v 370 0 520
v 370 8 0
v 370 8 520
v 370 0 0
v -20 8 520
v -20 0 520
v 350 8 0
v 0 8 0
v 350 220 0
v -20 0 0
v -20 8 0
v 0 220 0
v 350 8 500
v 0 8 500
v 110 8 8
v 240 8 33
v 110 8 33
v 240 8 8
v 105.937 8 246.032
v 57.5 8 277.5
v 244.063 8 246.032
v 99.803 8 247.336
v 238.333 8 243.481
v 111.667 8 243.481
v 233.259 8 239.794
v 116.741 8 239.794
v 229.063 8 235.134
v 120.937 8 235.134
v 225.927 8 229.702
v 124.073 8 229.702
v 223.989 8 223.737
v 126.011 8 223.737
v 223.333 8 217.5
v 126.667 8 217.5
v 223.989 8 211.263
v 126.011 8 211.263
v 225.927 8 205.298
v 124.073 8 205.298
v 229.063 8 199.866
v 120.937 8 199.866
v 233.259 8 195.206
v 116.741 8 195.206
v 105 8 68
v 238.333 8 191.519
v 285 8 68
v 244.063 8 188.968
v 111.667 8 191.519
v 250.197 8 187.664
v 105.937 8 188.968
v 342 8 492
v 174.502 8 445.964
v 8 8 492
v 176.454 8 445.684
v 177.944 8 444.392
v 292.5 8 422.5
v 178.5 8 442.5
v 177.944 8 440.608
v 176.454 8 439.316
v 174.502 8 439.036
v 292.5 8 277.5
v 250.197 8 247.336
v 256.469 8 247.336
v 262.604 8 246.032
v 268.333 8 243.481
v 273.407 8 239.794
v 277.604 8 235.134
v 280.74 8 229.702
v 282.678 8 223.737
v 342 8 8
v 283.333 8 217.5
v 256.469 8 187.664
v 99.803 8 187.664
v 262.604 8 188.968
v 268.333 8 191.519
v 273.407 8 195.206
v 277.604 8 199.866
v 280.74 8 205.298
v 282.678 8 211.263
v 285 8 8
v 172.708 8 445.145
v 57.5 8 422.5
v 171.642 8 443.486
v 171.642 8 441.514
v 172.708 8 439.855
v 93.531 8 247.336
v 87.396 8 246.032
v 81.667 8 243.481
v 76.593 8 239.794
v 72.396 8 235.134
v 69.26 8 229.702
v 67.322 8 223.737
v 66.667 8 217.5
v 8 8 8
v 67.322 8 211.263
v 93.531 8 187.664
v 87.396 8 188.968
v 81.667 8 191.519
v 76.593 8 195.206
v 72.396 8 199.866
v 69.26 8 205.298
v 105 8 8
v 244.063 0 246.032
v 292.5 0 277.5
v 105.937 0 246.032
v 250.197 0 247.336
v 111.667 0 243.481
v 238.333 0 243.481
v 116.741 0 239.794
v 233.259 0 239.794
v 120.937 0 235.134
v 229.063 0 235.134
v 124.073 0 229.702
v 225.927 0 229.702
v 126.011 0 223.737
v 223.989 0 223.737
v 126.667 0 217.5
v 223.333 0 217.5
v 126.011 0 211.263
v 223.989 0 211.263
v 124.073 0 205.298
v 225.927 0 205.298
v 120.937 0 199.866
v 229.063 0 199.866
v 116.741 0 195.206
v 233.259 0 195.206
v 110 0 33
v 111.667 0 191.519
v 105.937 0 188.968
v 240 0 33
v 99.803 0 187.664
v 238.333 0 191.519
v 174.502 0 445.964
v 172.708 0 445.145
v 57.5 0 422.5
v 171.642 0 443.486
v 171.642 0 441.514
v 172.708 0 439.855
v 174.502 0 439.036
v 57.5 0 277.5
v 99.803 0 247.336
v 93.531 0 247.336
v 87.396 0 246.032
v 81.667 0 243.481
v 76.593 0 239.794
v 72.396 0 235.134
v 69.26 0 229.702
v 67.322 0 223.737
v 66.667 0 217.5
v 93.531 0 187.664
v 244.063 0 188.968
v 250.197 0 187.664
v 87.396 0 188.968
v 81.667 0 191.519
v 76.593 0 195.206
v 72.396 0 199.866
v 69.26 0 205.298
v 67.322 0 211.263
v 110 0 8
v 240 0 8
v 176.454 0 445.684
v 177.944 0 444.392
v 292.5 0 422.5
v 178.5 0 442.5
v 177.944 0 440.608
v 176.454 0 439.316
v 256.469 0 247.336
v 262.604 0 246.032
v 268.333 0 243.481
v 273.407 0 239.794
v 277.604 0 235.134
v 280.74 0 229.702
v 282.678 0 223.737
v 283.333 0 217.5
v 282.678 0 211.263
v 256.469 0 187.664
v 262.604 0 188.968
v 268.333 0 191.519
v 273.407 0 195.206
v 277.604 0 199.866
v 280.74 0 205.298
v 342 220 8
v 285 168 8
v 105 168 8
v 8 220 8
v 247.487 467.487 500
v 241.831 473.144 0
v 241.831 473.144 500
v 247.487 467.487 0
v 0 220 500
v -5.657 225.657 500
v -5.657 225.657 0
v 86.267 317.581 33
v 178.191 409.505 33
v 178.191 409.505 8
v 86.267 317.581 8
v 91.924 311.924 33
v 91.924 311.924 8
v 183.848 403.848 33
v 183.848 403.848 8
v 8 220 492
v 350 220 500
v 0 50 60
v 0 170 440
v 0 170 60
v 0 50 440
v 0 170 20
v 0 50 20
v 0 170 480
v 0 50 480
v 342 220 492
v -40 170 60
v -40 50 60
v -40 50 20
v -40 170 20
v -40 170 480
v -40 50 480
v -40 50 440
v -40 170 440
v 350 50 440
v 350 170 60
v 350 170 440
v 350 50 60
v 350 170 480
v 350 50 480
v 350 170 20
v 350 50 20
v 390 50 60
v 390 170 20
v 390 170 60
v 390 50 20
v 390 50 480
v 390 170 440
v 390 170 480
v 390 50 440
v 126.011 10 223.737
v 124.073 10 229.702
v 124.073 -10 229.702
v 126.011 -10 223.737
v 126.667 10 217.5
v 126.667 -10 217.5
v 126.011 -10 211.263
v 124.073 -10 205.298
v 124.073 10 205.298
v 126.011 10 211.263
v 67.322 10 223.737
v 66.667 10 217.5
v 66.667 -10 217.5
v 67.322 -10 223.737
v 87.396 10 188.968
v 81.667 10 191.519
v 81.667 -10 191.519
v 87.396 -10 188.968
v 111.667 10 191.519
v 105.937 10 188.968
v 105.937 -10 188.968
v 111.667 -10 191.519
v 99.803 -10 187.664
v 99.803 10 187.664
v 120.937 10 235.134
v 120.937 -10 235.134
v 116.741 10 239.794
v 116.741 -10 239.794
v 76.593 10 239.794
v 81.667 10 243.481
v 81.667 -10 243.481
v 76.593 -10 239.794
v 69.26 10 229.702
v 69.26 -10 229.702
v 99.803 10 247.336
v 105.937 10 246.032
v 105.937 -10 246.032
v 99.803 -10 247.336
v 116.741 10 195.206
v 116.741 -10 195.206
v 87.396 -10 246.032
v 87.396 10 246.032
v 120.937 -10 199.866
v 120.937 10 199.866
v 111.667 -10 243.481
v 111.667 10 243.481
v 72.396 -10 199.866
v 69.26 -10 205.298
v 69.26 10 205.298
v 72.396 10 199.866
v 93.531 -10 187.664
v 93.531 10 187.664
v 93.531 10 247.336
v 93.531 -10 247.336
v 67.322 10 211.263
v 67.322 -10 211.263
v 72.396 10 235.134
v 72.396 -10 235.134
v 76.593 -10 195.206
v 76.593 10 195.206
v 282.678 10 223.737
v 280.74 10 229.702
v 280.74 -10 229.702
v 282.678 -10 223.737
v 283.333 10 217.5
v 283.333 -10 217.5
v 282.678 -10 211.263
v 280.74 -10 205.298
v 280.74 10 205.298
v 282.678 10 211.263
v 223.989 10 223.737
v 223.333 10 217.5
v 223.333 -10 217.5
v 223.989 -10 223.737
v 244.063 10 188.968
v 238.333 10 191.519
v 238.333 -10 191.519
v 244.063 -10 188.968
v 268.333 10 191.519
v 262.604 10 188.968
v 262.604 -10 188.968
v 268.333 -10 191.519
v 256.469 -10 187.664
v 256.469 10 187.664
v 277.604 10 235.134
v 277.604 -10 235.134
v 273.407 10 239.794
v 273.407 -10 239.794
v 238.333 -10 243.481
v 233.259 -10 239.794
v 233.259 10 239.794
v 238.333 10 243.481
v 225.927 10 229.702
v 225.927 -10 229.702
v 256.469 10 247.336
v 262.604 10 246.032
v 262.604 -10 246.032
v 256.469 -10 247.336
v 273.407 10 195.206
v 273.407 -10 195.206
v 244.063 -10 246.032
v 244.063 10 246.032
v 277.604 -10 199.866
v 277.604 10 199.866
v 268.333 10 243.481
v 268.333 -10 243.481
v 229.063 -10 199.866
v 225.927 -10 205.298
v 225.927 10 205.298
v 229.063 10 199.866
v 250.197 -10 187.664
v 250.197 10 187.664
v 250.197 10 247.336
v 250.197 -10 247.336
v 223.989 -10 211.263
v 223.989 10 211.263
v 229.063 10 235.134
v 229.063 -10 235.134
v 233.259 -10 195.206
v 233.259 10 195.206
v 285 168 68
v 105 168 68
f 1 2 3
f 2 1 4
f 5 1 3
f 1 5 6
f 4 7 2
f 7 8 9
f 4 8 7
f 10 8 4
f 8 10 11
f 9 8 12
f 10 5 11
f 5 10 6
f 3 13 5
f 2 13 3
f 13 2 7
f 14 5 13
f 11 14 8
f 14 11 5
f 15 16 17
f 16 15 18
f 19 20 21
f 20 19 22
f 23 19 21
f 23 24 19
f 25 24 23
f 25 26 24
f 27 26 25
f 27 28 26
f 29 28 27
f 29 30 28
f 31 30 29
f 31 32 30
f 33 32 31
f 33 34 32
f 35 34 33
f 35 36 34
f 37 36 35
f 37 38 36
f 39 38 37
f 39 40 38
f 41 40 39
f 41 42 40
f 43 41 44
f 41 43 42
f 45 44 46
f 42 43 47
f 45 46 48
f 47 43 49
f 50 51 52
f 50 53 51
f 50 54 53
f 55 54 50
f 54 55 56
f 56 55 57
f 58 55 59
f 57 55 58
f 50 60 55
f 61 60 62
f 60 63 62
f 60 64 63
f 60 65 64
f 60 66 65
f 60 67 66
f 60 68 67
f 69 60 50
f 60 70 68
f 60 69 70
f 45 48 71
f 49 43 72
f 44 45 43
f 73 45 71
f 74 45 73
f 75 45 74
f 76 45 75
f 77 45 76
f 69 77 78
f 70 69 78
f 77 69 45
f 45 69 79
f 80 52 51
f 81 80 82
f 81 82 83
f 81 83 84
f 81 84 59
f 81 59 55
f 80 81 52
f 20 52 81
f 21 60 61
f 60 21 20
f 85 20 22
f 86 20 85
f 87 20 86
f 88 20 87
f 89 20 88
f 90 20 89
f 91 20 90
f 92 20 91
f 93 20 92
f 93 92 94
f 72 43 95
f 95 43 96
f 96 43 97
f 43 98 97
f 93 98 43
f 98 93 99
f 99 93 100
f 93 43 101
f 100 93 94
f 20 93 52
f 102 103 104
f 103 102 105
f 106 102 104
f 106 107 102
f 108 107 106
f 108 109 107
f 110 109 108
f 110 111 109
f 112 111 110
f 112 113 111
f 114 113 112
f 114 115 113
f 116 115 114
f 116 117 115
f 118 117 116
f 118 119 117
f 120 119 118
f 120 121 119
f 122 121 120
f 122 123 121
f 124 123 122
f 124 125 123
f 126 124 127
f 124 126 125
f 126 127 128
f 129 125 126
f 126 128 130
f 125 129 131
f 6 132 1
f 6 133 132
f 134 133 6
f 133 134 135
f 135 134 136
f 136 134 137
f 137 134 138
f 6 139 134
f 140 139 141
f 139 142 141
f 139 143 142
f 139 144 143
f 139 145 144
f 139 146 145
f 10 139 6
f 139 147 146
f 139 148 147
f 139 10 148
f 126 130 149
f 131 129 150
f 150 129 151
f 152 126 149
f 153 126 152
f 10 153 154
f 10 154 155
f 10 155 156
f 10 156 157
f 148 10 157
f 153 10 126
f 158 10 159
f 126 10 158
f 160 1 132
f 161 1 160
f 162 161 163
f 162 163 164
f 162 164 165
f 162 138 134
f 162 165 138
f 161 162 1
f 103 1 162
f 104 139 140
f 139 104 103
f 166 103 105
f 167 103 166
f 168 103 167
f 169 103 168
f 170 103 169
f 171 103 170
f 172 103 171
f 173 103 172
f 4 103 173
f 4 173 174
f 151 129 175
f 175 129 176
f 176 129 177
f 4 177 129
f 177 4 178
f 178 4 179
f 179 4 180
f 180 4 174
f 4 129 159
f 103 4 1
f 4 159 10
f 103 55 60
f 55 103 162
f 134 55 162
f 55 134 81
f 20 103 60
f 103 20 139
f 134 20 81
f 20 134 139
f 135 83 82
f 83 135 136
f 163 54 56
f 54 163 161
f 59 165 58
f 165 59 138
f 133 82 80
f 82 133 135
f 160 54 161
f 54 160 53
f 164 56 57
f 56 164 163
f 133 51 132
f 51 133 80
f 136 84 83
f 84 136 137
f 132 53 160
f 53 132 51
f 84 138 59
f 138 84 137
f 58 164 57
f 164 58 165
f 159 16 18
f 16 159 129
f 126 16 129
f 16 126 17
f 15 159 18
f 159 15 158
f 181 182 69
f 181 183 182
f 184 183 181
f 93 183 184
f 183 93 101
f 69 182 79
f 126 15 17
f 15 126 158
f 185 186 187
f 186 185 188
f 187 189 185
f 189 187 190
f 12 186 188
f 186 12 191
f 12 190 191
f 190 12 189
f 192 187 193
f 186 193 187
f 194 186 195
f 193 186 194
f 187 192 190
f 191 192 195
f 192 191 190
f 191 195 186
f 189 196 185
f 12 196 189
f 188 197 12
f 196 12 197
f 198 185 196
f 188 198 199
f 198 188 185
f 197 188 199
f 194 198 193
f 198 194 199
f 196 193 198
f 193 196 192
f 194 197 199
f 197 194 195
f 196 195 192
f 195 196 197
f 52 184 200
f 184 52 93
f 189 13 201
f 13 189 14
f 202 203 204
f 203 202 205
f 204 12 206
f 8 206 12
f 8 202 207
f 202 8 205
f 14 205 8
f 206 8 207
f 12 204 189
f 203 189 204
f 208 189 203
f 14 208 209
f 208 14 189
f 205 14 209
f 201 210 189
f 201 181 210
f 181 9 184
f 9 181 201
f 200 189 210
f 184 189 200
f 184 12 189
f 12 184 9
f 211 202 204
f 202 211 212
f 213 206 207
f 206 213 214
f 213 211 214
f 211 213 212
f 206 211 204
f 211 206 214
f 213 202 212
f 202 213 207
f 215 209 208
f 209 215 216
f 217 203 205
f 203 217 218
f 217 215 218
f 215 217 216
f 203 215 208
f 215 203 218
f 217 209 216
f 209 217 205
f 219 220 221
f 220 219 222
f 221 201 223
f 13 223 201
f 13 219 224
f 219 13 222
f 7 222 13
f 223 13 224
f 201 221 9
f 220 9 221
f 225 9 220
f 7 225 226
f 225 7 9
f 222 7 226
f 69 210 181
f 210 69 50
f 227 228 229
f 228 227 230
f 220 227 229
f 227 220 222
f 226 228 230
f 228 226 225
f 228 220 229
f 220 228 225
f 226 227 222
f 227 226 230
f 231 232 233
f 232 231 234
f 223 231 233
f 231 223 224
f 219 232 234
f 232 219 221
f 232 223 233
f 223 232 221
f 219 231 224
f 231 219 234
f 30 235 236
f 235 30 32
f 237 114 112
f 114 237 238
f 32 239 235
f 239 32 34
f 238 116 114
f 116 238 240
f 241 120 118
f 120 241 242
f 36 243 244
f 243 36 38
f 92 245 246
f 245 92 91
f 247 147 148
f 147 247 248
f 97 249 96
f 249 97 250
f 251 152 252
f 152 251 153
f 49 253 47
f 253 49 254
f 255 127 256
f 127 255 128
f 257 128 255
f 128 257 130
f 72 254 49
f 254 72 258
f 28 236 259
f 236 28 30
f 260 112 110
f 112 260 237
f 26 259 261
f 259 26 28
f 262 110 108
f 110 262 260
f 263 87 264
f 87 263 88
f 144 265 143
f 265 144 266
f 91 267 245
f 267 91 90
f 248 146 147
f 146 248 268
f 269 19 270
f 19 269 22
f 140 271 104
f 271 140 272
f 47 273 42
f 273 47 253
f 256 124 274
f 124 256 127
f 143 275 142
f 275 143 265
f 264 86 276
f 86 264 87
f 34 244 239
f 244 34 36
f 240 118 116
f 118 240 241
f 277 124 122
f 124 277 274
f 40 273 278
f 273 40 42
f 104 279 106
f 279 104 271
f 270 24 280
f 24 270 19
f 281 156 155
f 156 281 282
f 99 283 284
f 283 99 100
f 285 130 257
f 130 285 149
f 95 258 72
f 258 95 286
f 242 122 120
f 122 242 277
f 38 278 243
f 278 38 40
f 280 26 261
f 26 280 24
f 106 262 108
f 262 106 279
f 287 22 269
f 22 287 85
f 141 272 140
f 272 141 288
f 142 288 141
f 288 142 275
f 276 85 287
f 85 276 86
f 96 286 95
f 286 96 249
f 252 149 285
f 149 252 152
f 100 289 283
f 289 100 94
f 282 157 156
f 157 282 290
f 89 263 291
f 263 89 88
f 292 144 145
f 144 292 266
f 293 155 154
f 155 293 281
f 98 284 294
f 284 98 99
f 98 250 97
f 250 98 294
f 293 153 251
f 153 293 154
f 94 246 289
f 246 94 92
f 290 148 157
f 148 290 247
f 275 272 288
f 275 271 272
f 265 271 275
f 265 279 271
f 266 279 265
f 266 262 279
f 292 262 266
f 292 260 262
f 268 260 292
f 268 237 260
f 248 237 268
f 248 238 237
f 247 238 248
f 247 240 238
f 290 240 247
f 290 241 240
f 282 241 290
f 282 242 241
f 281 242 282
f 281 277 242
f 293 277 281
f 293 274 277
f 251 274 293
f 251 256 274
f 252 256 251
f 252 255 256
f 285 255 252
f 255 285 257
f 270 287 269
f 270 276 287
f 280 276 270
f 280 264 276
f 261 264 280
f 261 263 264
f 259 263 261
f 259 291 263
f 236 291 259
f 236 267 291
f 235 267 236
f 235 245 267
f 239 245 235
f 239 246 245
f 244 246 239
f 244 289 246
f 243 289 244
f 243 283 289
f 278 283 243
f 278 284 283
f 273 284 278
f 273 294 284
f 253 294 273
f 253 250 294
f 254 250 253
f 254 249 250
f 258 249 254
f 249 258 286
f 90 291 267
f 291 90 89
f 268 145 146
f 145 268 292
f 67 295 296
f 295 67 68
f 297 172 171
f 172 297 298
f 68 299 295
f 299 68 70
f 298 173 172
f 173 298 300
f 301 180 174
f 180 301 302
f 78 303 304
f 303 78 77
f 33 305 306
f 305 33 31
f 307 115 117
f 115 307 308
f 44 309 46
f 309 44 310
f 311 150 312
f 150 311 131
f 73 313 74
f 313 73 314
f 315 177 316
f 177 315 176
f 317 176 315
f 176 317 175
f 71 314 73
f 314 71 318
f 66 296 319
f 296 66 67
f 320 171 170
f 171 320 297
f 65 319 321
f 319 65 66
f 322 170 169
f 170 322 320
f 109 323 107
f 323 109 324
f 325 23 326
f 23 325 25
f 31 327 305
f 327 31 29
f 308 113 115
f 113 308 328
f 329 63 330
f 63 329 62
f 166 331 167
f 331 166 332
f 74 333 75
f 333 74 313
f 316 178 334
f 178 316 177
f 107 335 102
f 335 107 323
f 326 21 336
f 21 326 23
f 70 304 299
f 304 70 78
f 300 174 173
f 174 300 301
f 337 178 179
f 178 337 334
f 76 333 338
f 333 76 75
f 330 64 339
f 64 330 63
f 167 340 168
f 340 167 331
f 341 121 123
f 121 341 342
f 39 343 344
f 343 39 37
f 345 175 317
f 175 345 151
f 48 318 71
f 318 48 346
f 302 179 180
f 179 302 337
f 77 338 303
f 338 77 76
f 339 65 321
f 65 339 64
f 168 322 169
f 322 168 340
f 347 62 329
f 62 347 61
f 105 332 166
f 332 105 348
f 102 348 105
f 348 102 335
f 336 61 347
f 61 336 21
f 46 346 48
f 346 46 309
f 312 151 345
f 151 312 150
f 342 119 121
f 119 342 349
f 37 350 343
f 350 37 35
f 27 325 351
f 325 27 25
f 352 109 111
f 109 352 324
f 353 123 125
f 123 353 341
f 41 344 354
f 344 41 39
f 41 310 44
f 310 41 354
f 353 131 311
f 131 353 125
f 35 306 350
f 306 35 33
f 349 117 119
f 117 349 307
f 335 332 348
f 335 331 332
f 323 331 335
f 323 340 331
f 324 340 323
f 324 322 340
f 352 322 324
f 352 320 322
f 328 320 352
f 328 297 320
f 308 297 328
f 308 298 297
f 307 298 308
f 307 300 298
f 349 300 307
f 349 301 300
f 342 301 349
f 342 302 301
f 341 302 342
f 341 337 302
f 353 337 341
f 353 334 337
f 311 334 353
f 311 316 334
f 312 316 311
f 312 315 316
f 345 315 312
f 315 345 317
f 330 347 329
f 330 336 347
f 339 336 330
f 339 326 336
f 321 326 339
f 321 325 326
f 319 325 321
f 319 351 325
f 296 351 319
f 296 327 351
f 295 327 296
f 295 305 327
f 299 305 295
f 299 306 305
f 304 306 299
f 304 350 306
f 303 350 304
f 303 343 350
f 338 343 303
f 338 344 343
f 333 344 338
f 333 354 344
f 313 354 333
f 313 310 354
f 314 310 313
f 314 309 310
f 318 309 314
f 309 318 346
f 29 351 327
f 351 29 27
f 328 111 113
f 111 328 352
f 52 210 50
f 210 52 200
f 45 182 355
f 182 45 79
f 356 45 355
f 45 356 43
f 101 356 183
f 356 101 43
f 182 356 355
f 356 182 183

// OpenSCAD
breite = 350;
hoehe = 500;
tiefe = 220;
d = 8;
border = 40;

lcd_w = 235;
lcd_h = 145;
lcd_offset = 150;

// Front
translate([-border/2,0,0])
difference() {
    color("Tan") cube([breite+border, d, hoehe + border/2]);
    // LCD
    translate([breite/2+border/2, 0, hoehe-lcd_offset]) 
        cube([lcd_w, d*10, lcd_h], center=true);
    // Kamera
    translate([breite/2+border/2, 0, hoehe-lcd_offset+lcd_h/2+20]) 
        rotate([90,0,0]) cylinder(d=7, h=100, center=true);
    // Drucker
    translate([breite/2+border/2,0,25/2+d]) 
        cube([130, 100, 25], center=true);
}
// Buttons
translate([breite/2-lcd_w/3,0,hoehe-lcd_offset-lcd_h/2-60])
    rotate([90,0,0]) color("yellow") cylinder(d=60, h=20, center=true);
translate([breite/2+lcd_w/3,0,hoehe-lcd_offset-lcd_h/2-60])
    rotate([90,0,0]) color("green") cylinder(d=60, h=20, center=true);

// Rückwand
translate([0,tiefe,0])
    rotate([0,0,45]) {
        difference() {
            color("Moccasin") cube([breite, d, hoehe]);
            translate([breite/2+border/2,0,25/2+d]) 
                cube([130, 100, 25], center=true);
        }
    }
// Links    
translate([0,0,0]) {
    color("Moccasin") cube([d, tiefe, hoehe]);
    translate([-20, tiefe/2, 40])
        color("Silver") cube([40,120,40], center=true);
    translate([-20, tiefe/2, hoehe-40])
        color("Silver") cube([40,120,40], center=true);
}
// Rechts    
translate([breite-d,0,0]) {
    color("Moccasin") cube([d, tiefe, hoehe]);
    translate([20+d, tiefe/2, 40])
        color("Silver") cube([40,120,40], center=true);
    translate([20+d, tiefe/2, hoehe-40])
        color("Silver") cube([40,120,40], center=true);
}

// Boden    
translate([0,0,0])
    color("Moccasin") cube([breite, tiefe, d]);

// Deckel
translate([0,0, hoehe-d])
    color("Moccasin") cube([breite, tiefe, d]);
    
// Drucker
translate([breite/2+border/2,160/2+d, d+60/2])
    color("DarkSlateGray") cube([180, 160, 60], center=true);
